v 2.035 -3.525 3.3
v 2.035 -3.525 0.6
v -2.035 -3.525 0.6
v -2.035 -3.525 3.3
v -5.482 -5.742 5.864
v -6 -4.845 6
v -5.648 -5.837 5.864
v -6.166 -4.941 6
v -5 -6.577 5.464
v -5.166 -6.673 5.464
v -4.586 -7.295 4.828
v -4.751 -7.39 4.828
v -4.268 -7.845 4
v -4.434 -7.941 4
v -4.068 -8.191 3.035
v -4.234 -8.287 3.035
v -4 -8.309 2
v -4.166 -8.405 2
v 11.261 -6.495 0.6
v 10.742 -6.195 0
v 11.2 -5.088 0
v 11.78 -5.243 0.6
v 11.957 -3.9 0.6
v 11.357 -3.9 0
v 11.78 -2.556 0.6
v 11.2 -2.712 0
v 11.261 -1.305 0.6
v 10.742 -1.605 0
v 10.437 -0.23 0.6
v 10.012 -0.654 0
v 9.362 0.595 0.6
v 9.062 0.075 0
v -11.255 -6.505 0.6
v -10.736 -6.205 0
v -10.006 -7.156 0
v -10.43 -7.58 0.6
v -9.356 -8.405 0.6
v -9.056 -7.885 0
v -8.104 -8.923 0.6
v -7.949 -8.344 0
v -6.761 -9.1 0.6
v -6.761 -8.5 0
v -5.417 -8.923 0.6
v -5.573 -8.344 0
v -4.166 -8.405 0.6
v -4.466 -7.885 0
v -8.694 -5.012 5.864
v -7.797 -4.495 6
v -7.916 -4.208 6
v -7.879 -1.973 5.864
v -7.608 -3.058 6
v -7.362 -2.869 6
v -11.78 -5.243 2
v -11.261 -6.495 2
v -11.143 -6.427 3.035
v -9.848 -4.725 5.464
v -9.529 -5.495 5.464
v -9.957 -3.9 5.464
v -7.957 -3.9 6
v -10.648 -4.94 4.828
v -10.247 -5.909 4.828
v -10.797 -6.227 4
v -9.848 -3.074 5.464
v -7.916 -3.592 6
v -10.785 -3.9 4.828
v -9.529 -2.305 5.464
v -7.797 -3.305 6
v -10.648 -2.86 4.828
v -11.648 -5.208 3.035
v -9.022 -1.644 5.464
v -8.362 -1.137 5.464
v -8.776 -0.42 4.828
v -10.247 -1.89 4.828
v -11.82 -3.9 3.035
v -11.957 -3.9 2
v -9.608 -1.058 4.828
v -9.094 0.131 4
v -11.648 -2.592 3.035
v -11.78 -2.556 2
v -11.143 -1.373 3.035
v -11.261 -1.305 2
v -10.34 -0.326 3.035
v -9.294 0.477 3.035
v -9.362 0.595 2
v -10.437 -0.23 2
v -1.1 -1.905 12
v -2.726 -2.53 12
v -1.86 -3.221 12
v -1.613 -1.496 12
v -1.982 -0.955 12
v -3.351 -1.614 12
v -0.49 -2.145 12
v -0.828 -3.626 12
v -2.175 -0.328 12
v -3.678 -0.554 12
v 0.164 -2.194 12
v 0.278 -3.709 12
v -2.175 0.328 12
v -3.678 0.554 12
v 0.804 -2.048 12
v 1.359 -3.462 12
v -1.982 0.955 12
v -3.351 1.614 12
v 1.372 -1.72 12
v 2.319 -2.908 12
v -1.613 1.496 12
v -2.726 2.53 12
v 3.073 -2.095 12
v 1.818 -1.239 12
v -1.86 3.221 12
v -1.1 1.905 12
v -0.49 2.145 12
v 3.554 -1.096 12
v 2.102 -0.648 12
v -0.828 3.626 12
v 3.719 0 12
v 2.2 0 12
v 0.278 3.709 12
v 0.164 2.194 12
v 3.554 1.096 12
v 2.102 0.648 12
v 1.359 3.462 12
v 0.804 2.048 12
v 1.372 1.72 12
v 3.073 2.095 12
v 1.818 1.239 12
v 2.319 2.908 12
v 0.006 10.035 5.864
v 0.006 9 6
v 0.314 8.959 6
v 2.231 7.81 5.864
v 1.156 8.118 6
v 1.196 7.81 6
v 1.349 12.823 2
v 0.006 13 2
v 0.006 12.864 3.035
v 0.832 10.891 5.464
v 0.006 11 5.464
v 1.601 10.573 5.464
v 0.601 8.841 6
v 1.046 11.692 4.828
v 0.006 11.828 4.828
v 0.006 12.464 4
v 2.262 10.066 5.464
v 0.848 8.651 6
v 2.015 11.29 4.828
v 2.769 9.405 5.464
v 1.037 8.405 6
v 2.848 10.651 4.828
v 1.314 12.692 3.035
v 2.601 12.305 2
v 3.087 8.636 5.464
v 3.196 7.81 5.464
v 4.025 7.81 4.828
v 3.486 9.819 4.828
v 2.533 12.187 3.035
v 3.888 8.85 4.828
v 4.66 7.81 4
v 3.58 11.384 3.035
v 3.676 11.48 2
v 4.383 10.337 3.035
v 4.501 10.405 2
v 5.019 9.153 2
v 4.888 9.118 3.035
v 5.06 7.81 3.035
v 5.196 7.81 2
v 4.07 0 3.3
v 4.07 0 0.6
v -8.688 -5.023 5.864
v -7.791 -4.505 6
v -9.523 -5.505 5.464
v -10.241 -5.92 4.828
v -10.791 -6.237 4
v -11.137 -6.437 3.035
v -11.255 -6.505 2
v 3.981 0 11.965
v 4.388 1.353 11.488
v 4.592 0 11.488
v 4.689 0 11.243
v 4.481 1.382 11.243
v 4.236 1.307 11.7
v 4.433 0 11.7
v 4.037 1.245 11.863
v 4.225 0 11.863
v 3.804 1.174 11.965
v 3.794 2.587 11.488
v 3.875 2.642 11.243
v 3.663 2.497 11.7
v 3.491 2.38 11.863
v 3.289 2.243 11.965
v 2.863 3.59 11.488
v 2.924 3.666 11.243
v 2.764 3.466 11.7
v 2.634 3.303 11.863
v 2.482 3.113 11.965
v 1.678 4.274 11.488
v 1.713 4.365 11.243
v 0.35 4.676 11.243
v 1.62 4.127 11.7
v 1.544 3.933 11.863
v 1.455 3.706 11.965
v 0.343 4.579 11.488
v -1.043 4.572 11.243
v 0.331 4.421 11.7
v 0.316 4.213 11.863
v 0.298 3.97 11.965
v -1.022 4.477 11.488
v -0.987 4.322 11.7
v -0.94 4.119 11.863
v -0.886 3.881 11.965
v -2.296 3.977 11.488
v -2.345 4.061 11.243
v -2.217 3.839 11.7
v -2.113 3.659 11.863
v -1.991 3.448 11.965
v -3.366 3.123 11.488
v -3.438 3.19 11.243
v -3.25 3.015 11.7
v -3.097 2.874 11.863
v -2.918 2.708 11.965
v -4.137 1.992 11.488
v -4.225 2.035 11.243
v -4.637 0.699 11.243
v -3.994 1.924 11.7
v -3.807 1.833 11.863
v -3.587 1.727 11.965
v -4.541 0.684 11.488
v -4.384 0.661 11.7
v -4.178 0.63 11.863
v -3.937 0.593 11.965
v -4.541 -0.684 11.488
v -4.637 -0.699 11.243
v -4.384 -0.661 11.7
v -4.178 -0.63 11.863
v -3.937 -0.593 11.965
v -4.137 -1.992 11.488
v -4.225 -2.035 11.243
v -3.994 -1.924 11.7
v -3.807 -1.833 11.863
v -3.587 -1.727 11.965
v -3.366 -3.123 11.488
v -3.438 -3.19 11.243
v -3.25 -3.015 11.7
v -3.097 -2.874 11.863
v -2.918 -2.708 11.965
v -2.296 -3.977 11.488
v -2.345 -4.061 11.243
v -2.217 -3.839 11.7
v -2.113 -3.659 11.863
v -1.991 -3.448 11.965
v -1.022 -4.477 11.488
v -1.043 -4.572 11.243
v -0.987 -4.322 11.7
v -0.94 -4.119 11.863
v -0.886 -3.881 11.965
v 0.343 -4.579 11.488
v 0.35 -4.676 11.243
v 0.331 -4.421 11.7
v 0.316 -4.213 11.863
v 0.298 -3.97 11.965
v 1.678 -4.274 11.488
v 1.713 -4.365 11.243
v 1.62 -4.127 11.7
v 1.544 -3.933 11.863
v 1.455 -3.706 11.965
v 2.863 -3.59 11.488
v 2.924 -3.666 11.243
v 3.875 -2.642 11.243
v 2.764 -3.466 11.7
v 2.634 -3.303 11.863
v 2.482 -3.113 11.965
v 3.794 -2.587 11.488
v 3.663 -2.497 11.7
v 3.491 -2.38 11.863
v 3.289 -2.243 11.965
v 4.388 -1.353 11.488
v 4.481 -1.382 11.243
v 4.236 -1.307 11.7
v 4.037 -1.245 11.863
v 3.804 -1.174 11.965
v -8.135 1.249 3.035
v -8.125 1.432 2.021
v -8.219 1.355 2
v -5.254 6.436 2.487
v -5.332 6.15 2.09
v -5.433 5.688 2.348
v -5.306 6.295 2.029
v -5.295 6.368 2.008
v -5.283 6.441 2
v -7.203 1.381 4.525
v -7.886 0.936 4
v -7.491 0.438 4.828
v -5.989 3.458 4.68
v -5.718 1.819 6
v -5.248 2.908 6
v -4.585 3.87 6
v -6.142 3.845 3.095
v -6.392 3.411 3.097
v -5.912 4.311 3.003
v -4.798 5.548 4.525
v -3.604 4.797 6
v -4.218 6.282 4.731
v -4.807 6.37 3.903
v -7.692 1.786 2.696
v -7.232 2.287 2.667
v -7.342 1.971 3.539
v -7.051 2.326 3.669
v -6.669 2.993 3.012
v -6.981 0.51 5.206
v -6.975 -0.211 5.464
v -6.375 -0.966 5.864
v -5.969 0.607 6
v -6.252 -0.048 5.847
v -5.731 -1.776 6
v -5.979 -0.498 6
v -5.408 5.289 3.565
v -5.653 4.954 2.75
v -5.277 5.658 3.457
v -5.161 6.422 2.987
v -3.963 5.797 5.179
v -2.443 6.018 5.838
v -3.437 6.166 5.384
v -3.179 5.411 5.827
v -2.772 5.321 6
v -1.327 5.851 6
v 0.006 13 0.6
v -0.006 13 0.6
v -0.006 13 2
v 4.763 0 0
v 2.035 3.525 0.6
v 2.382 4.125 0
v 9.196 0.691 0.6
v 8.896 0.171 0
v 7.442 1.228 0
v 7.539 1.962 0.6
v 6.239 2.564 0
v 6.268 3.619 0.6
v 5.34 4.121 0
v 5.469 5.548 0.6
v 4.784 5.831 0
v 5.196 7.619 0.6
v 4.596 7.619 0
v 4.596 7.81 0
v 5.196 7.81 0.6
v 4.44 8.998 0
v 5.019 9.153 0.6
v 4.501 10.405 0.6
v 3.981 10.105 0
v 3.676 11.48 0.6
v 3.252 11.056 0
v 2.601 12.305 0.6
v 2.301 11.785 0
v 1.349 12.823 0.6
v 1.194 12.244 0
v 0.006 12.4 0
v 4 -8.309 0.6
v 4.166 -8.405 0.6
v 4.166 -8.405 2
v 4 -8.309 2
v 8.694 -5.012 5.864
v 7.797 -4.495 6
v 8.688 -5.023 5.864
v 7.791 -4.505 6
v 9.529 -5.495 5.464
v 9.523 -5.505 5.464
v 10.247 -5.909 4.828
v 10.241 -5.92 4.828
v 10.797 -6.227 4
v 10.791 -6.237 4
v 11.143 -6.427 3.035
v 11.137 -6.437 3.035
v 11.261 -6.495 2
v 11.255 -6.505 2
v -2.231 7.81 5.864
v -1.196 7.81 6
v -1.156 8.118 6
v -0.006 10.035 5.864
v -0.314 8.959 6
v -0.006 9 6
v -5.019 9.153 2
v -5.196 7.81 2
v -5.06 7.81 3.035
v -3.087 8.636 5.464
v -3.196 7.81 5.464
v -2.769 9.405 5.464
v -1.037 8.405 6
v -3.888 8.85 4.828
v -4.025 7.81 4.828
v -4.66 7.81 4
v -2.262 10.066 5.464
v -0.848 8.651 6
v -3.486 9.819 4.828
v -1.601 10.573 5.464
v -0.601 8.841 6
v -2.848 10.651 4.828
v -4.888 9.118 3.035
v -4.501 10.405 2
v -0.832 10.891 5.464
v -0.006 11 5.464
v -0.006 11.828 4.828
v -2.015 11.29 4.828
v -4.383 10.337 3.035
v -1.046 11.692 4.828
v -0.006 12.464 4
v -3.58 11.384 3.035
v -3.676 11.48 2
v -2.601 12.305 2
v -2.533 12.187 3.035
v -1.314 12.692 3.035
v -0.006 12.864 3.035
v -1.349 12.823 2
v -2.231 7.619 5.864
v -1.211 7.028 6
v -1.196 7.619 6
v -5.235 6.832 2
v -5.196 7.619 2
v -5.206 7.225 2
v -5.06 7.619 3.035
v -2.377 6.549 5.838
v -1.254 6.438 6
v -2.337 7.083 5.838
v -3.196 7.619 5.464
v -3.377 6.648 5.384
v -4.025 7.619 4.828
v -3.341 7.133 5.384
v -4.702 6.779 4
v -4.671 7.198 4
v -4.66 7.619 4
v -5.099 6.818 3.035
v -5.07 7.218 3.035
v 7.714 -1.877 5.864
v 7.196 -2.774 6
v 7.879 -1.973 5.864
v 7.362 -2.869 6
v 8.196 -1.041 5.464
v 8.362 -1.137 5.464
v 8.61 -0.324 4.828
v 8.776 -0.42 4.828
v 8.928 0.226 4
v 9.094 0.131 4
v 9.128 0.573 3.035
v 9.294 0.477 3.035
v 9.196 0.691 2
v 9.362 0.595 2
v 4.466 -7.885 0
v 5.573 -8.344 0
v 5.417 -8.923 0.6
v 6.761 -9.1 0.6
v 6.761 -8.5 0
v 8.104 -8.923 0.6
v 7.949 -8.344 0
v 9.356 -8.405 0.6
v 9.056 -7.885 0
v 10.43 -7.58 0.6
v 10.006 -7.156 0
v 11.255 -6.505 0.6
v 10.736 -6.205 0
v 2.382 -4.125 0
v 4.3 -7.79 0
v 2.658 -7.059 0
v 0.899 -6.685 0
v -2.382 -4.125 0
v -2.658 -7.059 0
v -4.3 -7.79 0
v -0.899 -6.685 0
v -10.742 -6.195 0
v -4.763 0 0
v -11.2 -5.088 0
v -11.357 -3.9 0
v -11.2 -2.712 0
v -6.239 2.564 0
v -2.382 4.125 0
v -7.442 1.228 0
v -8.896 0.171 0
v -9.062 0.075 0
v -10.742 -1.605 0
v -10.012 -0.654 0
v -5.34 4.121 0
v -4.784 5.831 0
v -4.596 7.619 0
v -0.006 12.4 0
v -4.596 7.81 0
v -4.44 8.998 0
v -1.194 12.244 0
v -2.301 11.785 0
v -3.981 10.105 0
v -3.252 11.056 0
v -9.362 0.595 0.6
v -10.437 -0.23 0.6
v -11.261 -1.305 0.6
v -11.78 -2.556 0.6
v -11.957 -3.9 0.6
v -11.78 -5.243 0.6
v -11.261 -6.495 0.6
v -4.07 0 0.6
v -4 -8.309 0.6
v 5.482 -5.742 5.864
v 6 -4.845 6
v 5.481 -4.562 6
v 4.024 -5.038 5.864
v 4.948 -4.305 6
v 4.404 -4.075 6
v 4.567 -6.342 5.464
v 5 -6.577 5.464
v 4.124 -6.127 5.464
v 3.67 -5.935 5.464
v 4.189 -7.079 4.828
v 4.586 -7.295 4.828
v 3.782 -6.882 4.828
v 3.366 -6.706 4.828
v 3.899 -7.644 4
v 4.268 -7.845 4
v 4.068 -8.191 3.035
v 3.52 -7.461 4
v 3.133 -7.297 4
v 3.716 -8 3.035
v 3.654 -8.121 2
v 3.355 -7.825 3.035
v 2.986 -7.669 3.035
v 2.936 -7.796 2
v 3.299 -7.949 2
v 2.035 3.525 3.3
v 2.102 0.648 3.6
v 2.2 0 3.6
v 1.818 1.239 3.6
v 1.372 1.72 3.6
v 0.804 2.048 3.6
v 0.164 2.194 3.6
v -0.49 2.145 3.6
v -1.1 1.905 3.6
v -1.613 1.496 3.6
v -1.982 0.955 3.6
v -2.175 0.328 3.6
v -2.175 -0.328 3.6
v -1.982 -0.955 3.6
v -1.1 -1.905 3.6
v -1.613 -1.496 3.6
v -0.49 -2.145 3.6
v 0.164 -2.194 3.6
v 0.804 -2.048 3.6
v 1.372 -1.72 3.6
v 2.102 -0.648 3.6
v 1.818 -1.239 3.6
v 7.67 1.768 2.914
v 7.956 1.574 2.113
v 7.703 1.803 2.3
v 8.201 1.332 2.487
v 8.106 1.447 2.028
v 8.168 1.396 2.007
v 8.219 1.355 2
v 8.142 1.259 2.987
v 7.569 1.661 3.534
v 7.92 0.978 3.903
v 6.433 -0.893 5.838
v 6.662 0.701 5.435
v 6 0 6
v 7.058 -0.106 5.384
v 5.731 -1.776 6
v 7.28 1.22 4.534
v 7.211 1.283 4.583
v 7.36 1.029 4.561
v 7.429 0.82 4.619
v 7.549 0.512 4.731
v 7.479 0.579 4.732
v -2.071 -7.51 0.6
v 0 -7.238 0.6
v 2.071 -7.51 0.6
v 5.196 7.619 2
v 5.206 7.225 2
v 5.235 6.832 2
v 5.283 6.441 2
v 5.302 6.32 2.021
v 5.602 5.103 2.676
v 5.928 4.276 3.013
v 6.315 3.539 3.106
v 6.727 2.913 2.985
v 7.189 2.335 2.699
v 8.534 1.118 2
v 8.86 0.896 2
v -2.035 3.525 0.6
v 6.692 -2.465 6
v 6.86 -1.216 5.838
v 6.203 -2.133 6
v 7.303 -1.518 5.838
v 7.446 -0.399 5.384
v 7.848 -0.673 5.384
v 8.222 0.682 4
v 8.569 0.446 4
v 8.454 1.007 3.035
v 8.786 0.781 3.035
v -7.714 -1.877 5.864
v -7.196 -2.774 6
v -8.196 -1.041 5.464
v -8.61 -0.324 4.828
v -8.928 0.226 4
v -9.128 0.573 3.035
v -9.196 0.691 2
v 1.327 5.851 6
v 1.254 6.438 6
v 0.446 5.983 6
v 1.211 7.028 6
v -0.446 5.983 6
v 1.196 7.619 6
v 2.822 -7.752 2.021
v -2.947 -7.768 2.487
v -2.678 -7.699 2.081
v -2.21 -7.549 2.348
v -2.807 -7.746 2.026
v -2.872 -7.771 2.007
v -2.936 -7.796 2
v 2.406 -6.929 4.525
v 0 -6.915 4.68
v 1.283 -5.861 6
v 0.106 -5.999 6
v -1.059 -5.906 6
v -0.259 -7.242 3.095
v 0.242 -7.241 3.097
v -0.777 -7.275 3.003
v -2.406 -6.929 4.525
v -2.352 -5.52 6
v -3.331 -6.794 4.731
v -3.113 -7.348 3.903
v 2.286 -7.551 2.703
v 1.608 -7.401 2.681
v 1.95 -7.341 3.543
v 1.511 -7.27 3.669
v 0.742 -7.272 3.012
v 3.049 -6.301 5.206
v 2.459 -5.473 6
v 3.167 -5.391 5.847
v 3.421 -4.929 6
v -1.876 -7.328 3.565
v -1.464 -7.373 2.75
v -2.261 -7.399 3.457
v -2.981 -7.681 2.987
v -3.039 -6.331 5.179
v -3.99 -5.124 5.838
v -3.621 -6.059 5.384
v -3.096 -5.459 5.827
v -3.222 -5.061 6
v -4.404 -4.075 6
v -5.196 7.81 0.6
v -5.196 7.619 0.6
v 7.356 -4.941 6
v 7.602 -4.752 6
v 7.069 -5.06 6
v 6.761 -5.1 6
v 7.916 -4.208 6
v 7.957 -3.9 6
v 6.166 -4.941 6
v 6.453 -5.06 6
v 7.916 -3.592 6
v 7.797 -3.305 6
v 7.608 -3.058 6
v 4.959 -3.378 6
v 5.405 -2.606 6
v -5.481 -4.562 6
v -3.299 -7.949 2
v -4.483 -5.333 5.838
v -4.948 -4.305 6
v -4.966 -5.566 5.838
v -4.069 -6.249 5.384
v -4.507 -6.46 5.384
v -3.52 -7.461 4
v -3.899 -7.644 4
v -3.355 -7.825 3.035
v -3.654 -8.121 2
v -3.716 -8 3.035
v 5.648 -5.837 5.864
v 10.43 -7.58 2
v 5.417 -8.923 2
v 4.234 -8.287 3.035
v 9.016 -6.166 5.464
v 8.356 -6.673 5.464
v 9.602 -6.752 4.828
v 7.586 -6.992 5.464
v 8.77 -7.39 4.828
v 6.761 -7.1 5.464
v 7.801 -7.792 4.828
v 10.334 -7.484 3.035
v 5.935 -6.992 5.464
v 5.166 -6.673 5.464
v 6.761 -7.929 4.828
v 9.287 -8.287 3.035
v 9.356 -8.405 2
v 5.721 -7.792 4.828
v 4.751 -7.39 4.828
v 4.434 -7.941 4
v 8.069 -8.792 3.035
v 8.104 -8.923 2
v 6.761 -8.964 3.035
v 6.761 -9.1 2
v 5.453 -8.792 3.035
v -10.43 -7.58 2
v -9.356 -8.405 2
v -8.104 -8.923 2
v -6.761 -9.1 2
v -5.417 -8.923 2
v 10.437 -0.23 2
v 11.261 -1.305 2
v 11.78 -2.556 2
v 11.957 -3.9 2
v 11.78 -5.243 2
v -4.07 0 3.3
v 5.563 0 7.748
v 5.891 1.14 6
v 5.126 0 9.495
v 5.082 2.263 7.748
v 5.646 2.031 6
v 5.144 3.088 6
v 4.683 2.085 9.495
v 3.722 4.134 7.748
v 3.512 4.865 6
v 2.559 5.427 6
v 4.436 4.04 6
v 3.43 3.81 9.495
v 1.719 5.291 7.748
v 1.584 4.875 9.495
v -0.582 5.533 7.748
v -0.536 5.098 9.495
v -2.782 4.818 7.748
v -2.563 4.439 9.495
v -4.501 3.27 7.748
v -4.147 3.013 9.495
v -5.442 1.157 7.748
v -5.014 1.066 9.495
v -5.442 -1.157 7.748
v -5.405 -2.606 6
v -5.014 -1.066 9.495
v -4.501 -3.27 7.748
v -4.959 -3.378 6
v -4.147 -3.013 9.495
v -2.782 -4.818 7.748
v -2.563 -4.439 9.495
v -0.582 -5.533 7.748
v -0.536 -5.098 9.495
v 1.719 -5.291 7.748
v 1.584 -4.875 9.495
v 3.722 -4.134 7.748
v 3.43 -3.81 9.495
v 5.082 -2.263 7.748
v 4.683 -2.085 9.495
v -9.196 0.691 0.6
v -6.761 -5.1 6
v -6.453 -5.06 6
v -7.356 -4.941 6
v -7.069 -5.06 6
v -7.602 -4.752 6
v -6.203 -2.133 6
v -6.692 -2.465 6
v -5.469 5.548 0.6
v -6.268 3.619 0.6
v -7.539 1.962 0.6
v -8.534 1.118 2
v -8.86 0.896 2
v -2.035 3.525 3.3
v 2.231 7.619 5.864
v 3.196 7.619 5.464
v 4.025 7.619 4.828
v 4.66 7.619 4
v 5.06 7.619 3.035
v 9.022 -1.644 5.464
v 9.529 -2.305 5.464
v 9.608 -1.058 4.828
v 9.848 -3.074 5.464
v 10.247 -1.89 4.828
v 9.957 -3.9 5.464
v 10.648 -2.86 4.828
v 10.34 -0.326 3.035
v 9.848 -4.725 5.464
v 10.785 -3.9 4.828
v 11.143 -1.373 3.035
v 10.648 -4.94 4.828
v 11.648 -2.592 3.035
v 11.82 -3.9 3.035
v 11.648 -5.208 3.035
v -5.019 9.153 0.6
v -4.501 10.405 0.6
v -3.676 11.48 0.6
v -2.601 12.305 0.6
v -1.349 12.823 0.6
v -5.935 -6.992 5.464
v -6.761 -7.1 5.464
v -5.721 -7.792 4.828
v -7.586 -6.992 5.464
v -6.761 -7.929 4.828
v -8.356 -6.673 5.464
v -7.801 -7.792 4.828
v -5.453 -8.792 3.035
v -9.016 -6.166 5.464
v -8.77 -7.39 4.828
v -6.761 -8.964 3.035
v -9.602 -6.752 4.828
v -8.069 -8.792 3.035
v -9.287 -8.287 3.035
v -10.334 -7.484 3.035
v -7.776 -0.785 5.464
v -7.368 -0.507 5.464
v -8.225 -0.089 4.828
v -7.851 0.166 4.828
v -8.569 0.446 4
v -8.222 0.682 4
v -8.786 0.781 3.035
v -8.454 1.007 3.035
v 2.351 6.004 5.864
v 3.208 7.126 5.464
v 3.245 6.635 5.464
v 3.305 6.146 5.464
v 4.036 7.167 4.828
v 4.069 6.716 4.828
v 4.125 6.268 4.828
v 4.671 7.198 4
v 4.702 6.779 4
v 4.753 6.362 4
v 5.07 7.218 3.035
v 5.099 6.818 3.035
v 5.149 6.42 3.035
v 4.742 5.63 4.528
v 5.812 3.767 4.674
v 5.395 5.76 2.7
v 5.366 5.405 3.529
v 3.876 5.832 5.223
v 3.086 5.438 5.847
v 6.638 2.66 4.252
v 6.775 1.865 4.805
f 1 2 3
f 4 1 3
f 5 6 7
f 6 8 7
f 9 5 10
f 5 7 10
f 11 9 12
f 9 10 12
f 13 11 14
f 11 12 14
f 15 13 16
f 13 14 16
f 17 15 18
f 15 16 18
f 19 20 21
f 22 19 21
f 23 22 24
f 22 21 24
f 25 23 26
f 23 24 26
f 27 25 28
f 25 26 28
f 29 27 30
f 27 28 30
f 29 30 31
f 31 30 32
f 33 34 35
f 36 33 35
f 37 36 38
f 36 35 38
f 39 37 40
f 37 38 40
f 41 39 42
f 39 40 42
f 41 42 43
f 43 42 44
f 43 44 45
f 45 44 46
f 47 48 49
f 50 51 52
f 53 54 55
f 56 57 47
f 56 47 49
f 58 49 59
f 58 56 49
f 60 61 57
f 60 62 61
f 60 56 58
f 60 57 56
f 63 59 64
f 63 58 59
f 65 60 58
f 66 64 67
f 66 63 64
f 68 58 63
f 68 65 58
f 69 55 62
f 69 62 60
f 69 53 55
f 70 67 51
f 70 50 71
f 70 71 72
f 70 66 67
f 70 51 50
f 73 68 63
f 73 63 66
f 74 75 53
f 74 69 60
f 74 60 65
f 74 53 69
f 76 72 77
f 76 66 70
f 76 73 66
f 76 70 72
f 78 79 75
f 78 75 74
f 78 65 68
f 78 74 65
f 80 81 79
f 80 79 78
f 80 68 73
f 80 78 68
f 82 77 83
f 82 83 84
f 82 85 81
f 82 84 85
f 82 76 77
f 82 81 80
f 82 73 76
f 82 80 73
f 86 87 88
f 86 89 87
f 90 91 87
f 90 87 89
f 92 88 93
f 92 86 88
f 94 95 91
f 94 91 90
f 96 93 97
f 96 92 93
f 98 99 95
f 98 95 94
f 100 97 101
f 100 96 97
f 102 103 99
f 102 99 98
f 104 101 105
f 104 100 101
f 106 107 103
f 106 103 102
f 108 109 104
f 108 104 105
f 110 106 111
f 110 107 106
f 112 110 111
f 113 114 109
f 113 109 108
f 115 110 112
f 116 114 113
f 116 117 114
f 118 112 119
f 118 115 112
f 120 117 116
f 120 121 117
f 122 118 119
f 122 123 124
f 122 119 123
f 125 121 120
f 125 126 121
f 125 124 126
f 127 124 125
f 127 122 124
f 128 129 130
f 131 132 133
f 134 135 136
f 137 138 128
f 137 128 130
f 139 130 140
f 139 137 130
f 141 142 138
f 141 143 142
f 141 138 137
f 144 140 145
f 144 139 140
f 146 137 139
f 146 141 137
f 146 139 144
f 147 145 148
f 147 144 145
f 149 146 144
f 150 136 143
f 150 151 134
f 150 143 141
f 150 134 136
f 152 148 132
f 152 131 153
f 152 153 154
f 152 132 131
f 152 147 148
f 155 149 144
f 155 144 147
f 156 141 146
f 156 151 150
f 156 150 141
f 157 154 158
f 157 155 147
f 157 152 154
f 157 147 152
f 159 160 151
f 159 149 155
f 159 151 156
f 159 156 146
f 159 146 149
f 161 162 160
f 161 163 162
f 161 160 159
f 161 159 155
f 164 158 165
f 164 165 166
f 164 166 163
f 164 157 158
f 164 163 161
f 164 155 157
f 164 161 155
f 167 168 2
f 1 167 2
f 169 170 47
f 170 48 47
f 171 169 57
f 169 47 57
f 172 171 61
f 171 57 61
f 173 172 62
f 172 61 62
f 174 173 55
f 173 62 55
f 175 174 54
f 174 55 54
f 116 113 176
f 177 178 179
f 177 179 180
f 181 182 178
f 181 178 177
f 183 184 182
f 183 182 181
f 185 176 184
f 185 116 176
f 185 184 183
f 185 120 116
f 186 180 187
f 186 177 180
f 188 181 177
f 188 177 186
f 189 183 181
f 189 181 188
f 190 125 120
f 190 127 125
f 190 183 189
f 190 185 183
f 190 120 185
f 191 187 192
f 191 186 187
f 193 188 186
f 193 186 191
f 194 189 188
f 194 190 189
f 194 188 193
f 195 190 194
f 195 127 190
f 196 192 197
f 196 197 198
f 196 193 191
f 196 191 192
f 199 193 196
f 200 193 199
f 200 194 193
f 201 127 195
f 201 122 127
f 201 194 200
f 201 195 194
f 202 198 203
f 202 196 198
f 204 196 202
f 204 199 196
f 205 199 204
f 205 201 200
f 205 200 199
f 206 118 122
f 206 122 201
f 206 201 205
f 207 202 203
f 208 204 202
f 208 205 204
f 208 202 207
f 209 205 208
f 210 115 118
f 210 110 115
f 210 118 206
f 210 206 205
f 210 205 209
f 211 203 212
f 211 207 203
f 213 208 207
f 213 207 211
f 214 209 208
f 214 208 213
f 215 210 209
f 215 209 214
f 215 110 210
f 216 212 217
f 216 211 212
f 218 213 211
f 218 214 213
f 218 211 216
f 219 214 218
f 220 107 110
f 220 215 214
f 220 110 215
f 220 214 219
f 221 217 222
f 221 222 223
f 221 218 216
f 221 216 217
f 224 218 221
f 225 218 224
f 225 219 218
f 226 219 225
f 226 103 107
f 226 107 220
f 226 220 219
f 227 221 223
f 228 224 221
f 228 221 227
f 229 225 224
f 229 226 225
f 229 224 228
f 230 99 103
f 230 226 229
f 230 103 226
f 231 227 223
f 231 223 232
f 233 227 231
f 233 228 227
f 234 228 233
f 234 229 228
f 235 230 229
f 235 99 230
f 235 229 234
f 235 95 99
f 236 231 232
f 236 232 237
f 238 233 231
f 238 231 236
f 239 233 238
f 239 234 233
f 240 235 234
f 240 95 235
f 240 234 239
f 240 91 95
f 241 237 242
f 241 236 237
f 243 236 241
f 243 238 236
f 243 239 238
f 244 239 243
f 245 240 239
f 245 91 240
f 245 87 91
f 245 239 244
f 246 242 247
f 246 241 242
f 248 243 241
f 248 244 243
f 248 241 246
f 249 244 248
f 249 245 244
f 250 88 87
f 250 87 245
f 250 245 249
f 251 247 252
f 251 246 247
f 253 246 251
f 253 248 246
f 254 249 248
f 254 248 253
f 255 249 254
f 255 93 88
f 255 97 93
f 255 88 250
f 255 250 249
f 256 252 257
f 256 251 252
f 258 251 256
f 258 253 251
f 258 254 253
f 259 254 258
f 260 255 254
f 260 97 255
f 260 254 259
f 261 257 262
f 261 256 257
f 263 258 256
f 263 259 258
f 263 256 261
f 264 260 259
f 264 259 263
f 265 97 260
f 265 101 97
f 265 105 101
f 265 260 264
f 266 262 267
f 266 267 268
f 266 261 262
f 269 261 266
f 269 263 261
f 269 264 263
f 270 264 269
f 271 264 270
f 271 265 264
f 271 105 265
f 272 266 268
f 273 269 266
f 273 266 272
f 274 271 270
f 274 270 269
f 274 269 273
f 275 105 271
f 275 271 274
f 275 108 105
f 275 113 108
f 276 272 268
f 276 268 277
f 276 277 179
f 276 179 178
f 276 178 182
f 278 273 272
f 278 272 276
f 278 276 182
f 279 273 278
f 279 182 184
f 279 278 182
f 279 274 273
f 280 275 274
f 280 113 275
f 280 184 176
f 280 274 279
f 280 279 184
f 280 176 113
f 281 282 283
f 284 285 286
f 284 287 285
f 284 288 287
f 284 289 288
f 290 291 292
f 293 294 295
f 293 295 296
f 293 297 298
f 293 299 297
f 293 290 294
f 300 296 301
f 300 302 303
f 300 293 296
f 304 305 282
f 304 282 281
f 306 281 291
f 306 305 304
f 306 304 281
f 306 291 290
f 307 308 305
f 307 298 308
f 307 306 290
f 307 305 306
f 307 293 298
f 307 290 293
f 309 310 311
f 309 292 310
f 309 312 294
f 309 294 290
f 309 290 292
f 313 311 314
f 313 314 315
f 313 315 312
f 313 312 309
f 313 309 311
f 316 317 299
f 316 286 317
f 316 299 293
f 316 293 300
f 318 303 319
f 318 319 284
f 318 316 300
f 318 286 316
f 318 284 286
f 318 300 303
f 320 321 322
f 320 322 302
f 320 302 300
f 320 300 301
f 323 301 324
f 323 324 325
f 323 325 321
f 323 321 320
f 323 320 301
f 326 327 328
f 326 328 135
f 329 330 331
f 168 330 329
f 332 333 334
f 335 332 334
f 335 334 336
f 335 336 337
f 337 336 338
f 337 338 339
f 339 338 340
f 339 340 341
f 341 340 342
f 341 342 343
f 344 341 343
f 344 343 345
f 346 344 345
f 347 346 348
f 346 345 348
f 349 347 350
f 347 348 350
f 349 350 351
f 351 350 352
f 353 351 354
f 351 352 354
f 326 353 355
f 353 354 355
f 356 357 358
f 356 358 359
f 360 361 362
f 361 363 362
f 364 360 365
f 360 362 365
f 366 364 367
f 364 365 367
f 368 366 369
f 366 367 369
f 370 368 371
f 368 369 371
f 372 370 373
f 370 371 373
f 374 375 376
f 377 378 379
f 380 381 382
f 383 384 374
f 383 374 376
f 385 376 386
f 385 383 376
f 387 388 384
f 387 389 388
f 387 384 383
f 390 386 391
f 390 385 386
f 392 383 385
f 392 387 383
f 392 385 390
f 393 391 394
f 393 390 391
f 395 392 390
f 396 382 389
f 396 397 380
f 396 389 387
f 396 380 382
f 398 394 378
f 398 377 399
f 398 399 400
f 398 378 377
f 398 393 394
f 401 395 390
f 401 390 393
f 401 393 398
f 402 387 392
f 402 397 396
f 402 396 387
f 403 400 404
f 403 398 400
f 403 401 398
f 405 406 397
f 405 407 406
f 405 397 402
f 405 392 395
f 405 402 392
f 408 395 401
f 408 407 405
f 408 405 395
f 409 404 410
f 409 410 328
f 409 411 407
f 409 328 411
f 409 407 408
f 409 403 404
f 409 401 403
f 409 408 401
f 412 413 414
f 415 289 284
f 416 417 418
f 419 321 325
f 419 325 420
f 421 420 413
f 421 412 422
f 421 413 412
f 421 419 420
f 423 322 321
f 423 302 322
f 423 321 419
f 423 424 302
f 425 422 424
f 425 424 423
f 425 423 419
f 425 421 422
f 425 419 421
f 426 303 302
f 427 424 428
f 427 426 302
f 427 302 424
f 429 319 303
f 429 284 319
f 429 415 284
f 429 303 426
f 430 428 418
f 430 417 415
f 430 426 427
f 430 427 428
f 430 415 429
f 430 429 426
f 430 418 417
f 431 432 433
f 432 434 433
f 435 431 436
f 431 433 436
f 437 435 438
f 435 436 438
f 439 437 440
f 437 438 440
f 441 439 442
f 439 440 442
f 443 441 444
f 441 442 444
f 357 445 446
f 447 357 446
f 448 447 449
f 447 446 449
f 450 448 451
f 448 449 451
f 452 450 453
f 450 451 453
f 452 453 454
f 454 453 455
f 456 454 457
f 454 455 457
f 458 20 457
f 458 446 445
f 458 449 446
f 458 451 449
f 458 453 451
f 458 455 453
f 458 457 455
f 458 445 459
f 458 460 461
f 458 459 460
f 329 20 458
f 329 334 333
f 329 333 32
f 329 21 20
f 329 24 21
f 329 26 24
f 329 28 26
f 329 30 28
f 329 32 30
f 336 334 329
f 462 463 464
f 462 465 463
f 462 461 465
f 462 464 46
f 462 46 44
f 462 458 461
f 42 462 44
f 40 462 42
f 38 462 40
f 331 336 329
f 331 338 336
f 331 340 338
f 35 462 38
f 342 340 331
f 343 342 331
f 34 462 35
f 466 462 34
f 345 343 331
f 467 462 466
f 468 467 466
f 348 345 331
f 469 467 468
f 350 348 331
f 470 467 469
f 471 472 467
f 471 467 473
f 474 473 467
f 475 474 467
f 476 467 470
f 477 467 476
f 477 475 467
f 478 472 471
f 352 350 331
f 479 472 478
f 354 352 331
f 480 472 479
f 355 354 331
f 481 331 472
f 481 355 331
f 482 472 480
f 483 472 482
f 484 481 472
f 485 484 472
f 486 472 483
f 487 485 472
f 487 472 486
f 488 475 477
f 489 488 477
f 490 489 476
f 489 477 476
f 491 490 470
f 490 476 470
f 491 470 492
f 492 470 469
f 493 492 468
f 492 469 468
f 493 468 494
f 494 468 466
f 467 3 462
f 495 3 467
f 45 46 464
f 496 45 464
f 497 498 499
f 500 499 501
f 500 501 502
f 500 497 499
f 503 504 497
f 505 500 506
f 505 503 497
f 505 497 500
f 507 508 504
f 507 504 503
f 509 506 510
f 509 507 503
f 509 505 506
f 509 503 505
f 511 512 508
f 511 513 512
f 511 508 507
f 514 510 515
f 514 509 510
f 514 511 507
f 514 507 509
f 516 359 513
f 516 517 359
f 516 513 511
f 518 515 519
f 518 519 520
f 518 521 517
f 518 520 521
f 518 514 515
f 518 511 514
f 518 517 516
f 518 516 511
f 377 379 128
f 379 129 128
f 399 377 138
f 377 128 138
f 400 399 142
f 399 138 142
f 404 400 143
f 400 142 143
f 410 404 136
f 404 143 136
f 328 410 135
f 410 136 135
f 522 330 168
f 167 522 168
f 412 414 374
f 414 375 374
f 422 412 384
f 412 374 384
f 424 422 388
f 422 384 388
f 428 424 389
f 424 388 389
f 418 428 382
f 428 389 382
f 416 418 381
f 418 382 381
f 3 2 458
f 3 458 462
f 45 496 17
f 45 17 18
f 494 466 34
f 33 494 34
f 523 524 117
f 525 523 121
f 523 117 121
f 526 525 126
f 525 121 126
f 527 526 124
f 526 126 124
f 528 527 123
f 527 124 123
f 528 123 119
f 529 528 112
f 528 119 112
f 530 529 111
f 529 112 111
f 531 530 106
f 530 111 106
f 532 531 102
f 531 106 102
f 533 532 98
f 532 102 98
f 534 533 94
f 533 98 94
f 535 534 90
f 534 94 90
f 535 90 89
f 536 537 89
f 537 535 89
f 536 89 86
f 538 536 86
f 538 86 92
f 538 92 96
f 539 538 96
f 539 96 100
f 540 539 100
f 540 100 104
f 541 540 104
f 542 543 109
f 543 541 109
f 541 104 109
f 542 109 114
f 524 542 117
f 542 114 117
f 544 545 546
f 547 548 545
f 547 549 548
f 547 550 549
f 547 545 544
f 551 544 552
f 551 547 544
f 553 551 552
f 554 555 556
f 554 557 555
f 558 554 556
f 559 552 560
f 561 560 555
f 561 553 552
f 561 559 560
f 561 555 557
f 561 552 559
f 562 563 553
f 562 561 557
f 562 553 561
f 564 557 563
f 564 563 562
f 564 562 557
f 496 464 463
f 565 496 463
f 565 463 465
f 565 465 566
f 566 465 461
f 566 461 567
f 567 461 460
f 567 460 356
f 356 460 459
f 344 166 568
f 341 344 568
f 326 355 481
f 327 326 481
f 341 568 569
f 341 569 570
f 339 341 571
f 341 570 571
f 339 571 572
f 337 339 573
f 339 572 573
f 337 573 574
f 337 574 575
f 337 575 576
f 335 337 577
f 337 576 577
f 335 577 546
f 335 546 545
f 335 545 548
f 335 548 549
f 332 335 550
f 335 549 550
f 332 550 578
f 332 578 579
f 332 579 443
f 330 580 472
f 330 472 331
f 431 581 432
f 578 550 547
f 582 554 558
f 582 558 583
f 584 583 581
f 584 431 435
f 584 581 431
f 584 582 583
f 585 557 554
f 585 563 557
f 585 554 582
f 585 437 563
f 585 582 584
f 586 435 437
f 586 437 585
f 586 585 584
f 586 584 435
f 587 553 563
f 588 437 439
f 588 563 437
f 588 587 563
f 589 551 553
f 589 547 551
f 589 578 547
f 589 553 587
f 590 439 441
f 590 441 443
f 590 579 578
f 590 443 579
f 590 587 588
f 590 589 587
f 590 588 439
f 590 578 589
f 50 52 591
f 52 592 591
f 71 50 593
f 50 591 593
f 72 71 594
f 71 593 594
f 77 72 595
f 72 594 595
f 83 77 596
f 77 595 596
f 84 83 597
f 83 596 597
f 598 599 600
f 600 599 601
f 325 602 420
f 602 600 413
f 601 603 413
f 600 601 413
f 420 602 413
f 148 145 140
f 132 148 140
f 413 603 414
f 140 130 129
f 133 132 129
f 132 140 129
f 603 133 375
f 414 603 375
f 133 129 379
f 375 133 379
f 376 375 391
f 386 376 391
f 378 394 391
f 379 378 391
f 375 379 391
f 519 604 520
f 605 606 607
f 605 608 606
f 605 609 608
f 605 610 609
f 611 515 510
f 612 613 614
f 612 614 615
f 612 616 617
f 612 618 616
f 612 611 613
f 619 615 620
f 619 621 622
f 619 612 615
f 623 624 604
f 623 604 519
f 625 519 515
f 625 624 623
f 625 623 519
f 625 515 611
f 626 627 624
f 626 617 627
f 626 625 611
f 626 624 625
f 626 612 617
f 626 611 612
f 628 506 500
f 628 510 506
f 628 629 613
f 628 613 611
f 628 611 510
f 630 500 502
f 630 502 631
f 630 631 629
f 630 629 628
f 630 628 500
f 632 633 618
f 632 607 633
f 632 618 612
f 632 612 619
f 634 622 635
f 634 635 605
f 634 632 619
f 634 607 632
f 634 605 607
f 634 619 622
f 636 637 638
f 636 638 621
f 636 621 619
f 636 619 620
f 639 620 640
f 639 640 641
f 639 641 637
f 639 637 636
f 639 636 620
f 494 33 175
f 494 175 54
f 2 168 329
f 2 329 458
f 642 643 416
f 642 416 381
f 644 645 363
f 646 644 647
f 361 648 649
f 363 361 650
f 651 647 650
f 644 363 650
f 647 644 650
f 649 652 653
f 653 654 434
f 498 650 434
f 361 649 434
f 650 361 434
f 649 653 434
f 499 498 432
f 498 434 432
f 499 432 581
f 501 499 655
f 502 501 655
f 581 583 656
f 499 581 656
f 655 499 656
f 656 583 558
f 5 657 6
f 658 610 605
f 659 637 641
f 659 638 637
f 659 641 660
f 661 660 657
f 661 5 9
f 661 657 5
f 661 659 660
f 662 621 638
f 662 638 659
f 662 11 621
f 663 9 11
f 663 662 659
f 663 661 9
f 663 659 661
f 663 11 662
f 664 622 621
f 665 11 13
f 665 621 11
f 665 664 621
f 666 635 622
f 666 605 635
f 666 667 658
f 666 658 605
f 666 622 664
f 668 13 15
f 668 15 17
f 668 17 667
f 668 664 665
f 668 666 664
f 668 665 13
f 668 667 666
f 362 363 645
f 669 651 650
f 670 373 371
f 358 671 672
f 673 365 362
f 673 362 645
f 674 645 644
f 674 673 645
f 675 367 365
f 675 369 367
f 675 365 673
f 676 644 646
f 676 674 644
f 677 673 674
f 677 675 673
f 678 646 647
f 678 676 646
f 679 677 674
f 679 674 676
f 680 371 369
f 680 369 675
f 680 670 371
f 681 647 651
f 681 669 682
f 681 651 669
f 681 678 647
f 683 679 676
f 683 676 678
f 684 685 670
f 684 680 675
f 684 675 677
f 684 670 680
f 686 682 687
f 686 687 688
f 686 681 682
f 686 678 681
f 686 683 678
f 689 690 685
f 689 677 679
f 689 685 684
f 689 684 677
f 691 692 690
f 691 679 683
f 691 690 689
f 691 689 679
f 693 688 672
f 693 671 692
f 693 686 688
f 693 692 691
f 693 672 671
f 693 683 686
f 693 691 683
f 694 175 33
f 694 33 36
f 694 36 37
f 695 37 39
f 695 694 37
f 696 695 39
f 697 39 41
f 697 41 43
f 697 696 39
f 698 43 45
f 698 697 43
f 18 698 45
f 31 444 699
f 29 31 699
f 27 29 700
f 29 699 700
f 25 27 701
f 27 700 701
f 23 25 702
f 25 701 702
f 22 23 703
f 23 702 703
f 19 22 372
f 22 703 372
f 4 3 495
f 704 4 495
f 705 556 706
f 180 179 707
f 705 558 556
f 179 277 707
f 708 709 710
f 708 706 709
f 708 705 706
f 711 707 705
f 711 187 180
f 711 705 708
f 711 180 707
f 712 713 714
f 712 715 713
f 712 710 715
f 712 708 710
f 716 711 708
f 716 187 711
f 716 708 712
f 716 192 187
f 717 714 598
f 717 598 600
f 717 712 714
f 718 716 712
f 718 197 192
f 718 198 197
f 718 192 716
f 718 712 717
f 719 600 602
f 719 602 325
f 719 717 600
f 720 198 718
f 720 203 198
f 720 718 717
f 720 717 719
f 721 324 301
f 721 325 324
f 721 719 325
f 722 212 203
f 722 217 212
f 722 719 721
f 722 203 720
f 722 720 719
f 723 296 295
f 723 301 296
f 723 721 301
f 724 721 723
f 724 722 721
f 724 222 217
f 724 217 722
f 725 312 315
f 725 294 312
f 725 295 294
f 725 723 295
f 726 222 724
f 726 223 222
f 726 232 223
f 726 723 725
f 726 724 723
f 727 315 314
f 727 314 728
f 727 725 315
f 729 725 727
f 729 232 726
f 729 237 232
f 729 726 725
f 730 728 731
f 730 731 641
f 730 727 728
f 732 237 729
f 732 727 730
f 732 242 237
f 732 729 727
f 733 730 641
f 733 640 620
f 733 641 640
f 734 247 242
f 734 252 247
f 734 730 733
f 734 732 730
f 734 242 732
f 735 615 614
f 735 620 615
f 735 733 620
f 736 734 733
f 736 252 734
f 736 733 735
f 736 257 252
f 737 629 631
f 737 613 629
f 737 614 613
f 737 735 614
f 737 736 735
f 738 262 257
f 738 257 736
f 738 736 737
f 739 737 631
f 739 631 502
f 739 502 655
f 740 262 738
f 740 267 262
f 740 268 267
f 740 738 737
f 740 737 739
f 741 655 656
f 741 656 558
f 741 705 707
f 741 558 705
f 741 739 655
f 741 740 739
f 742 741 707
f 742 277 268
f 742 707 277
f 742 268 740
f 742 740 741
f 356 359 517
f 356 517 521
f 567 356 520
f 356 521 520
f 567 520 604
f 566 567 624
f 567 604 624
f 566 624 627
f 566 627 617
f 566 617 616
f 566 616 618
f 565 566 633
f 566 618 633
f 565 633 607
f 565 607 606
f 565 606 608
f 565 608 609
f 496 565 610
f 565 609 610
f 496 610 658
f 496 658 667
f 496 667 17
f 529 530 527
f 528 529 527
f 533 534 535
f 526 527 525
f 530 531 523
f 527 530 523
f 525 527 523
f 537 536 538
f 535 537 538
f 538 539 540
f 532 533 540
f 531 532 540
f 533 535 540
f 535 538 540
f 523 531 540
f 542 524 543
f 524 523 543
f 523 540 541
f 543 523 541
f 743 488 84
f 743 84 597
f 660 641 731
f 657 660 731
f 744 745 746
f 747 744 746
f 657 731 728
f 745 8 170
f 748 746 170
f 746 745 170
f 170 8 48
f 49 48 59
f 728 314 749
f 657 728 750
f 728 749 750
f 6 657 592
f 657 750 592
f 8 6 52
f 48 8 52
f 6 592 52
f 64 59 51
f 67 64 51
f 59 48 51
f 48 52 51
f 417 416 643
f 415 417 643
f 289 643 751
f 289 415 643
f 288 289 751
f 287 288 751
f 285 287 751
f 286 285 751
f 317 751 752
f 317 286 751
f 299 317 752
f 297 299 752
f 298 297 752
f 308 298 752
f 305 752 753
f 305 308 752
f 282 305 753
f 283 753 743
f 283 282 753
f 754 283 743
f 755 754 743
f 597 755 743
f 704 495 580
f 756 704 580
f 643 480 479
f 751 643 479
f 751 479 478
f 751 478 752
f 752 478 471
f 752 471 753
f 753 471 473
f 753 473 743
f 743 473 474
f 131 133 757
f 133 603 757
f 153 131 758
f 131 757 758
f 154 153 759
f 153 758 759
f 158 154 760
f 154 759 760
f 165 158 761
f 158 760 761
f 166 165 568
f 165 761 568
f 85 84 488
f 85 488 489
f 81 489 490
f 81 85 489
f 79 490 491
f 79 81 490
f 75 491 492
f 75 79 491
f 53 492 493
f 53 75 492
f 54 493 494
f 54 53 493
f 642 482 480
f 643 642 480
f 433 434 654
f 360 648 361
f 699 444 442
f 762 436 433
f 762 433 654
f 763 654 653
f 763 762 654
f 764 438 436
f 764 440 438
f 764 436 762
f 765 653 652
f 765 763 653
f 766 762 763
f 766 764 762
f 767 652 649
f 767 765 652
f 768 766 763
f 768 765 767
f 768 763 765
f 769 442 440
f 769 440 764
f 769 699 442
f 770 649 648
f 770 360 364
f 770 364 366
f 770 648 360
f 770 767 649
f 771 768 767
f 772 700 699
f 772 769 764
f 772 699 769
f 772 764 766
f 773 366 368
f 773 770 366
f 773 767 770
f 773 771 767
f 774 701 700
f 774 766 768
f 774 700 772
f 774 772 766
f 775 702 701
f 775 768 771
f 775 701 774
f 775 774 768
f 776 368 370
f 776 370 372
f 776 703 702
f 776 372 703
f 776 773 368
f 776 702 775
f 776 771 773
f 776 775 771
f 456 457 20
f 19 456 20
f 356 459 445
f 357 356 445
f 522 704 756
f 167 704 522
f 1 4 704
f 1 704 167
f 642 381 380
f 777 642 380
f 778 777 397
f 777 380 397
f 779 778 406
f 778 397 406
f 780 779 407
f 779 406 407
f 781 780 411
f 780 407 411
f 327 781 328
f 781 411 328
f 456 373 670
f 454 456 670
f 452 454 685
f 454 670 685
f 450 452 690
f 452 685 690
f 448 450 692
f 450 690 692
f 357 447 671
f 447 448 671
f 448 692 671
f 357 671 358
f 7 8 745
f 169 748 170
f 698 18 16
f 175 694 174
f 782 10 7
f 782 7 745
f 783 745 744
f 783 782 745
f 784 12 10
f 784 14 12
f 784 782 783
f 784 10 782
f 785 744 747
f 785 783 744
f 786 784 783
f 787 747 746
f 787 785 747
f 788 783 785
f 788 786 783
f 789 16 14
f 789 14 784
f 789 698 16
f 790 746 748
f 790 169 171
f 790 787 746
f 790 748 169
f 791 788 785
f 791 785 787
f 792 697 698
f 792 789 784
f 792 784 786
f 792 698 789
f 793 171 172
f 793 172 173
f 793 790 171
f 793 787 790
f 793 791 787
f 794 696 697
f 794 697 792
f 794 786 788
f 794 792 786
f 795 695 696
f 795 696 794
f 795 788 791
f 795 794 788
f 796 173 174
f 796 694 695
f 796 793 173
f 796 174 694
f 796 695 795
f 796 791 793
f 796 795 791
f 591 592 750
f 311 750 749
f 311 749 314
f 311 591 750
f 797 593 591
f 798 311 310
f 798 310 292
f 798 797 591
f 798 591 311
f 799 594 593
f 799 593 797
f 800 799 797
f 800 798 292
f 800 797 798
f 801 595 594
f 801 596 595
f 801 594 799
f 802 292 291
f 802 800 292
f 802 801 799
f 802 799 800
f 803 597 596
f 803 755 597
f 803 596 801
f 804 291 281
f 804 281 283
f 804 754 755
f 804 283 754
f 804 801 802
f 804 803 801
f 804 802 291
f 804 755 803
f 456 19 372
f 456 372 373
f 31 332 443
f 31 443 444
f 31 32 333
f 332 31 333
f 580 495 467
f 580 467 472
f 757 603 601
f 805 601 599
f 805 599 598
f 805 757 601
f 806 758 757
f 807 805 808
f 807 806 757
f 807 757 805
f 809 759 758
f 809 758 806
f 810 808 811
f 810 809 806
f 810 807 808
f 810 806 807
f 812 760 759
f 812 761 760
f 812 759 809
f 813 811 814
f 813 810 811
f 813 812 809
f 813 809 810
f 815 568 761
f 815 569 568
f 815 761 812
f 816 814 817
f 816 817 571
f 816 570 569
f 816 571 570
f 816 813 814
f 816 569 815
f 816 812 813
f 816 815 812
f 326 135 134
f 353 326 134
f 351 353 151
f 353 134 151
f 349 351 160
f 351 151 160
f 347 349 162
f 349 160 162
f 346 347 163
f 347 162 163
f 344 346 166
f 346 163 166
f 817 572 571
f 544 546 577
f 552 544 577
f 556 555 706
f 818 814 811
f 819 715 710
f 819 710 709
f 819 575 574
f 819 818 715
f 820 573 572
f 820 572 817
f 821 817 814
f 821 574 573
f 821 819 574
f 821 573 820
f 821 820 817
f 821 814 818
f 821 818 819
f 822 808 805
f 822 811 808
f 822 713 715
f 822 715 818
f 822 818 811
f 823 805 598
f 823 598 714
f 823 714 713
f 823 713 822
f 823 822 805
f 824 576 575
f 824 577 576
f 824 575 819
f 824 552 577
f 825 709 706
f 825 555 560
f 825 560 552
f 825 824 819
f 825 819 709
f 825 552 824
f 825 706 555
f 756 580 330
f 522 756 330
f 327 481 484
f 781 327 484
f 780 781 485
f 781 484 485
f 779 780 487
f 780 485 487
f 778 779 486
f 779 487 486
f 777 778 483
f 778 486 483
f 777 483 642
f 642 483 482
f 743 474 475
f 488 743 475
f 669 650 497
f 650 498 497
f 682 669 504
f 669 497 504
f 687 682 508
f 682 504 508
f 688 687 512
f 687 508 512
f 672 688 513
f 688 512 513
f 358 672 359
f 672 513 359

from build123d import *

# Parameters (mm, degrees)
PAD_DEPTH       = 6
FILLET_R        = 8
FILLET001_R     = 5.19
FILLET002_R     = 4
SKETCH002_R     = 2.2
POCKET_DEPTH    = 12.001
POCKET001_DEPTH = 3.3
SKETCH005_R     = 2.2
PAD001_DEPTH    = 0.3
FILLET003_R     = 1
CHAMFER_SIZE    = 0.6
CHAMFER001_SIZE = 0.6


with BuildPart() as revolution:
    # Sketch004 → Revolution (revolve)
    with BuildSketch(Plane.XZ):
        Polygon((4.5, 12), (0, 12), (0, 6), (6, 6), align=None)
    revolve(axis=Axis((0, 0, 0), (0, 0, 1)))


with BuildPart() as chamfer001:
    # Sketch → Pad (new body)
    with BuildSketch(Plane.XY):
        Polygon((-5.196152, 3), (-5.196152, 13), (5.196152, 13), (5.196152, 3), (13.856406, -2), (8.660254, -11), (0, -6), (-8.660254, -11), (-13.856406, -2), align=None)
    extrude(amount=PAD_DEPTH)

    # Fillet
    fillet_edges = [chamfer001.edges().sort_by_distance(p)[0] for p in [
        (-5.196152, 3, 3),
        (5.196152, 3, 3),
        (0, -6, 3),
    ]]
    fillet(fillet_edges, radius=FILLET_R)

    # Fusion: union Revolution
    add(revolution.part)

    # Fillet001
    fillet001_edges = [chamfer001.edges().sort_by_distance(p)[0] for p in [
        (-8.660254, -11, 3),
        (-13.856406, -2, 3),
        (-5.196152, 13, 3),
        (5.196152, 13, 3),
        (13.856406, -2, 3),
        (8.660254, -11, 3),
    ]]
    fillet(fillet001_edges, radius=FILLET001_R)

    # Fillet002
    fillet002_edges = [chamfer001.edges().sort_by_distance(p)[0] for p in [
        (6.267949, 3.618802, 6),
    ]]
    fillet(fillet002_edges, radius=FILLET002_R)

    # Sketch002 → Pocket (cut, through all)
    with BuildSketch(Plane.XY.offset(12)):
        Circle(SKETCH002_R)
    extrude(amount=-POCKET_DEPTH, mode=Mode.SUBTRACT)

    # Sketch003 → Pocket001 (cut)
    with BuildSketch(Plane(origin=(0, 0, 0), x_dir=(1, 0, 0), z_dir=(0, 0, -1))):
        Polygon((4.070319, 0), (2.03516, 3.525), (-2.03516, 3.525), (-4.070319, 0), (-2.03516, -3.525), (2.03516, -3.525), align=None)
    extrude(amount=-POCKET001_DEPTH, mode=Mode.SUBTRACT)

    # Sketch005 → Pad001 (new body)
    with BuildSketch(Plane(origin=(0, 0, 3.3), x_dir=(1, 0, 0), z_dir=(0, 0, -1))):
        Circle(SKETCH005_R)
    extrude(amount=-PAD001_DEPTH)

    # Fillet003
    fillet003_edges = [chamfer001.edges().sort_by_distance(p)[0] for p in [
        (-4.5, 0, 12),
    ]]
    fillet(fillet003_edges, radius=FILLET003_R)

    # Chamfer
    chamfer_edges = [chamfer001.edges().sort_by_distance(p)[0] for p in [
        (-6.267949, 3.618802, 0),
    ]]
    chamfer(chamfer_edges, length=CHAMFER_SIZE)

    # Chamfer001
    chamfer001_edges = [chamfer001.edges().sort_by_distance(p)[0] for p in [
        (3.05274, 1.7625, 0),
        (0, 3.525, 0),
        (-3.05274, 1.7625, 0),
        (-3.05274, -1.7625, 0),
        (0, -3.525, 0),
        (3.05274, -1.7625, 0),
    ]]
    chamfer(chamfer001_edges, length=CHAMFER001_SIZE)


solid = chamfer001.part
